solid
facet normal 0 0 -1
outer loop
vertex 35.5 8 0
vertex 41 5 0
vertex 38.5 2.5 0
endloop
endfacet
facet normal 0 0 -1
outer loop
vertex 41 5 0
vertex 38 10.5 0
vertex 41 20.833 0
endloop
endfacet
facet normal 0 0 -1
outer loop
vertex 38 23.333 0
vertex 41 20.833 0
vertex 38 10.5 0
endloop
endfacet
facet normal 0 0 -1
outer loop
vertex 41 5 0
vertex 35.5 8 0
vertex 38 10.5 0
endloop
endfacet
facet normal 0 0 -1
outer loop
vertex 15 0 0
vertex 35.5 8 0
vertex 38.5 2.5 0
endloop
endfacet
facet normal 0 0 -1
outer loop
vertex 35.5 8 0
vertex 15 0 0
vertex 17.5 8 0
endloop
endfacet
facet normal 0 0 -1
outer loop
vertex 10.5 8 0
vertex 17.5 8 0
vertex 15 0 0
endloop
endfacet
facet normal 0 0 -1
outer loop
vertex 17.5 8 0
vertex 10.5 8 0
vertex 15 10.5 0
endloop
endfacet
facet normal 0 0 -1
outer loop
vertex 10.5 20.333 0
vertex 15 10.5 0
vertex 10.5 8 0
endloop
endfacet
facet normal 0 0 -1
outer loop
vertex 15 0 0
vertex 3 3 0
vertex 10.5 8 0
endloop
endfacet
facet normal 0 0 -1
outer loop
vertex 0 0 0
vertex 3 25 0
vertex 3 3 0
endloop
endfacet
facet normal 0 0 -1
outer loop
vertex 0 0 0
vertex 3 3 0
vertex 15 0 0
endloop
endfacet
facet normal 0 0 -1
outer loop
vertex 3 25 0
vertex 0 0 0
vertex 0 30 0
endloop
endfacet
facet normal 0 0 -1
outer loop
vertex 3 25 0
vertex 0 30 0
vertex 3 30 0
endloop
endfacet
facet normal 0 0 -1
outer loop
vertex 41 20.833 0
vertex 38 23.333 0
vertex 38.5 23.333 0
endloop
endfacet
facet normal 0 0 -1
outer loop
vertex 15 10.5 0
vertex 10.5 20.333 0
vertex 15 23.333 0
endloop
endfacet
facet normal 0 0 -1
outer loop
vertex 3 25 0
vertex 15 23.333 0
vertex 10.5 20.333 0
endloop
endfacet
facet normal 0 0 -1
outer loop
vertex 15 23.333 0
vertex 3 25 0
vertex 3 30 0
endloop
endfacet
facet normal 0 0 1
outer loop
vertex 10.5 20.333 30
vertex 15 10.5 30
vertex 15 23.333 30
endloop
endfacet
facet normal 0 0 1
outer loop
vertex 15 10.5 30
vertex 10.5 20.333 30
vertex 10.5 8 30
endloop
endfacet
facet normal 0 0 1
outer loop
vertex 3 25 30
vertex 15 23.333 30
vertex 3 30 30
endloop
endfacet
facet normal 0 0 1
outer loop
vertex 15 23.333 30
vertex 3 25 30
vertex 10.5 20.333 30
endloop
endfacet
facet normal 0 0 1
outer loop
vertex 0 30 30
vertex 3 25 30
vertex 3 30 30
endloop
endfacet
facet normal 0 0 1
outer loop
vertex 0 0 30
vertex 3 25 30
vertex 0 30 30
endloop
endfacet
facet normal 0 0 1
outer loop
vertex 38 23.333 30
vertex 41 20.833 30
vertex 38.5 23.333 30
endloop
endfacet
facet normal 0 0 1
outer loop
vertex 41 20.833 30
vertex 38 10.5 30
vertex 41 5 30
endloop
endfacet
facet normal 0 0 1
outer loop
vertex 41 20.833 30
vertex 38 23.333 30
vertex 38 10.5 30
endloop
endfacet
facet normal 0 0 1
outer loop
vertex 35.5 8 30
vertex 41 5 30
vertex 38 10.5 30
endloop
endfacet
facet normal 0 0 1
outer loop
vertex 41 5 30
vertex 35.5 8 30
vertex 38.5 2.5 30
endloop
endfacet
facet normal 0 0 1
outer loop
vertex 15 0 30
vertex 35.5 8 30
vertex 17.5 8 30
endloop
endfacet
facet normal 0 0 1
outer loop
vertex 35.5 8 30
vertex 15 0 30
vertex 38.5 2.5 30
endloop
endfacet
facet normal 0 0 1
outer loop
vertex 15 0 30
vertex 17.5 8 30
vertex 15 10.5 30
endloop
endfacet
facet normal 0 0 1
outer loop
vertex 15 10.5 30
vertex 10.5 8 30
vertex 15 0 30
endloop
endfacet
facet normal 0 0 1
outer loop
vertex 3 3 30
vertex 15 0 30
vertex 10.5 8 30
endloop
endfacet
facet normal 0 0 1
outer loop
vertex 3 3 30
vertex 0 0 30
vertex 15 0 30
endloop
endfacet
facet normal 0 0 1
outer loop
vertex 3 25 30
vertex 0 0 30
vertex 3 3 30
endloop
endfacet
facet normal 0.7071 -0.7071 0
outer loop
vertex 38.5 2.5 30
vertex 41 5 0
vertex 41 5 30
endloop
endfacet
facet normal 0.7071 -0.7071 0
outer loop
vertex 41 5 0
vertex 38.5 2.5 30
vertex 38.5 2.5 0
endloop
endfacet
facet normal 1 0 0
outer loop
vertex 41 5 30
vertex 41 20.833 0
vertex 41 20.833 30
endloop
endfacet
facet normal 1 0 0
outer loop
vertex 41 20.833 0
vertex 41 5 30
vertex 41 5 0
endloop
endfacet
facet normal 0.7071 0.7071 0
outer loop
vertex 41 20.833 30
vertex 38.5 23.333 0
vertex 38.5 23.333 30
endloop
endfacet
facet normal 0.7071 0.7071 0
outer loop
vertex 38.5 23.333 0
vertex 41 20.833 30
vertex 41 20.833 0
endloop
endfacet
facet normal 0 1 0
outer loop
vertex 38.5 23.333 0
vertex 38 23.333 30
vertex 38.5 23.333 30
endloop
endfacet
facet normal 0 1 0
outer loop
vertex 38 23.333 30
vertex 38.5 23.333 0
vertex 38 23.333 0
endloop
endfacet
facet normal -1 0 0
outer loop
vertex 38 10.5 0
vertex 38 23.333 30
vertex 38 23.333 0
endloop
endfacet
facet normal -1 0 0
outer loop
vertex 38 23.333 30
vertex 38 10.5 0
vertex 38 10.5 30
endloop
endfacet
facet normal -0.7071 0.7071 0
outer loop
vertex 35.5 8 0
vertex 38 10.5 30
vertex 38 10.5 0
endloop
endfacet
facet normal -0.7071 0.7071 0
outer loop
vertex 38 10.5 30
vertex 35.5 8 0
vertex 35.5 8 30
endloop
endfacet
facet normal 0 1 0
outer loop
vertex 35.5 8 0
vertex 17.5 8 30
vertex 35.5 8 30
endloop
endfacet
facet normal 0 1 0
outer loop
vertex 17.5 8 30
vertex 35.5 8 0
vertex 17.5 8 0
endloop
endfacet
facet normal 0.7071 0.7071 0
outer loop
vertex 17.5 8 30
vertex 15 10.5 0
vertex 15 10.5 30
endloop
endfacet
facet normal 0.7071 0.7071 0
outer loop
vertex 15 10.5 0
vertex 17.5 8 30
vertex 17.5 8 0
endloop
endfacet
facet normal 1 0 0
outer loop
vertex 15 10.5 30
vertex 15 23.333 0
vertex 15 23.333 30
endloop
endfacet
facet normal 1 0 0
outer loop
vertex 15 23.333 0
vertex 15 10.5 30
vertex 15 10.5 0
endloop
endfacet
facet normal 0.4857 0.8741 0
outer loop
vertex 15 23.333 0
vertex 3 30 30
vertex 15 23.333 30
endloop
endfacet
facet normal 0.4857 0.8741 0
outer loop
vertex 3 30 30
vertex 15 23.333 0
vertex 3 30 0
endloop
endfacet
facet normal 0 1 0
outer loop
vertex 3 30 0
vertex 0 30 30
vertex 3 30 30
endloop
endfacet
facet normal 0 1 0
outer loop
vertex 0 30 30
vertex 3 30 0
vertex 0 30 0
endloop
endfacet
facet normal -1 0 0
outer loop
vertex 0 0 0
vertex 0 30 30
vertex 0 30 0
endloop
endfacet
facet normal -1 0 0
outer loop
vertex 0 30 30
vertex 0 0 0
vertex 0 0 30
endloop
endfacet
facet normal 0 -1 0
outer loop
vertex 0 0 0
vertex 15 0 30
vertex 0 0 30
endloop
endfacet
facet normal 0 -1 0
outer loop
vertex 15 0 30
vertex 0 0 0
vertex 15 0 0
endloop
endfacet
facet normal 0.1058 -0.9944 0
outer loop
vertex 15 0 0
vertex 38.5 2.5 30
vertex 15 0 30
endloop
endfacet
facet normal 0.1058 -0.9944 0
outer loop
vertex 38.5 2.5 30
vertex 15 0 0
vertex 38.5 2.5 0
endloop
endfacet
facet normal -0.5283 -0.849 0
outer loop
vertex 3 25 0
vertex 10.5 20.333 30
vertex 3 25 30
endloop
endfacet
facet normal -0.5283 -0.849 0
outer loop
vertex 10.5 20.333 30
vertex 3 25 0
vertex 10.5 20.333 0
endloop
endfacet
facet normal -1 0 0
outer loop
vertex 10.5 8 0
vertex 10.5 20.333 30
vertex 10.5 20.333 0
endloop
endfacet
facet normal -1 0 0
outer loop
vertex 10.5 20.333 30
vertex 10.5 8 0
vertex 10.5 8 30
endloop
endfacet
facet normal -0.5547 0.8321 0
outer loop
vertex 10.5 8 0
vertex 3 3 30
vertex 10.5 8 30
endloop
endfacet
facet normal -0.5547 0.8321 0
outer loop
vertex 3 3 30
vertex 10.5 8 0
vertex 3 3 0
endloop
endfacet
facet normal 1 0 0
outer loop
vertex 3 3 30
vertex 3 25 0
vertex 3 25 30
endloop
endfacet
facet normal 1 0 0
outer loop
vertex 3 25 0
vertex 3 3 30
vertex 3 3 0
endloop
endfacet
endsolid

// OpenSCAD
// created by IndiePandaaaaa | Lukas

width = 30;
pole_diameter = 21; // diameter of the pole
wall_offset = 15;
height = width;
hook_width = width;

module towel_hook(width, height, pole_diameter, wall_offset, hook_width, material_strength = 3, socket = 5, chamfer =
2.5) {
    if (wall_offset < material_strength) {
        wall_offset = material_strength;
    }

    pole_dia = pole_diameter + 2; // diameter of the pole with additional offset
    mat_strength = material_strength;

    module hook_width_removal(width) {

        if (width < 0) {
            width = width * - 1;
            echo("width was negativ. New width: ", width);
        }

        linear_extrude(height = width) {
            polygon([
                    [wall_offset, 0],
                    [wall_offset + pole_dia + mat_strength - chamfer, socket - chamfer],
                    [wall_offset + pole_dia + mat_strength, socket],
                    [wall_offset + pole_dia + mat_strength, socket + mat_strength + pole_dia / 3 * 2 - chamfer],
                    [wall_offset + pole_dia + mat_strength - chamfer, socket + mat_strength + pole_dia / 3 * 2],
                    [wall_offset + pole_dia, socket + mat_strength + pole_dia / 3 * 2],
                    [wall_offset + pole_dia, socket + mat_strength + chamfer],
                    [wall_offset + pole_dia - chamfer, socket + mat_strength],
                    [wall_offset + chamfer, socket + mat_strength],
                    [wall_offset, socket + mat_strength + chamfer],
                ]);
        }
    }

    difference() {
        linear_extrude(height = width) {
            difference() {
                polygon([
                        [0, 0],
                        [wall_offset, 0],
                        [wall_offset + pole_dia + mat_strength - chamfer, socket - chamfer],
                        [wall_offset + pole_dia + mat_strength, socket],
                        [wall_offset + pole_dia + mat_strength, socket + mat_strength + pole_dia / 3 * 2 - chamfer],
                        [wall_offset + pole_dia + mat_strength - chamfer, socket + mat_strength + pole_dia / 3 * 2],
                        [wall_offset + pole_dia, socket + mat_strength + pole_dia / 3 * 2],
                        [wall_offset + pole_dia, socket + mat_strength + chamfer],
                        [wall_offset + pole_dia - chamfer, socket + mat_strength],
                        [wall_offset + chamfer, socket + mat_strength],
                        [wall_offset, socket + mat_strength + chamfer],
                        [wall_offset, socket + mat_strength + pole_dia / 3 * 2],
                        [mat_strength, height],
                        [0, height],
                    ]);
                polygon([
                        [mat_strength, mat_strength],
                        [wall_offset - mat_strength * 1.5, mat_strength + socket],
                        [wall_offset - mat_strength * 1.5, socket + pole_dia / 3 * 2],
                        [mat_strength, height - socket],
                    ]);
            }
        }

        removal = (width - hook_width) / 2;
        hook_width_removal(removal);
        translate([0, 0, hook_width + removal])
            hook_width_removal(removal);
    }
}

towel_hook(width, height, pole_diameter, wall_offset, hook_width);
